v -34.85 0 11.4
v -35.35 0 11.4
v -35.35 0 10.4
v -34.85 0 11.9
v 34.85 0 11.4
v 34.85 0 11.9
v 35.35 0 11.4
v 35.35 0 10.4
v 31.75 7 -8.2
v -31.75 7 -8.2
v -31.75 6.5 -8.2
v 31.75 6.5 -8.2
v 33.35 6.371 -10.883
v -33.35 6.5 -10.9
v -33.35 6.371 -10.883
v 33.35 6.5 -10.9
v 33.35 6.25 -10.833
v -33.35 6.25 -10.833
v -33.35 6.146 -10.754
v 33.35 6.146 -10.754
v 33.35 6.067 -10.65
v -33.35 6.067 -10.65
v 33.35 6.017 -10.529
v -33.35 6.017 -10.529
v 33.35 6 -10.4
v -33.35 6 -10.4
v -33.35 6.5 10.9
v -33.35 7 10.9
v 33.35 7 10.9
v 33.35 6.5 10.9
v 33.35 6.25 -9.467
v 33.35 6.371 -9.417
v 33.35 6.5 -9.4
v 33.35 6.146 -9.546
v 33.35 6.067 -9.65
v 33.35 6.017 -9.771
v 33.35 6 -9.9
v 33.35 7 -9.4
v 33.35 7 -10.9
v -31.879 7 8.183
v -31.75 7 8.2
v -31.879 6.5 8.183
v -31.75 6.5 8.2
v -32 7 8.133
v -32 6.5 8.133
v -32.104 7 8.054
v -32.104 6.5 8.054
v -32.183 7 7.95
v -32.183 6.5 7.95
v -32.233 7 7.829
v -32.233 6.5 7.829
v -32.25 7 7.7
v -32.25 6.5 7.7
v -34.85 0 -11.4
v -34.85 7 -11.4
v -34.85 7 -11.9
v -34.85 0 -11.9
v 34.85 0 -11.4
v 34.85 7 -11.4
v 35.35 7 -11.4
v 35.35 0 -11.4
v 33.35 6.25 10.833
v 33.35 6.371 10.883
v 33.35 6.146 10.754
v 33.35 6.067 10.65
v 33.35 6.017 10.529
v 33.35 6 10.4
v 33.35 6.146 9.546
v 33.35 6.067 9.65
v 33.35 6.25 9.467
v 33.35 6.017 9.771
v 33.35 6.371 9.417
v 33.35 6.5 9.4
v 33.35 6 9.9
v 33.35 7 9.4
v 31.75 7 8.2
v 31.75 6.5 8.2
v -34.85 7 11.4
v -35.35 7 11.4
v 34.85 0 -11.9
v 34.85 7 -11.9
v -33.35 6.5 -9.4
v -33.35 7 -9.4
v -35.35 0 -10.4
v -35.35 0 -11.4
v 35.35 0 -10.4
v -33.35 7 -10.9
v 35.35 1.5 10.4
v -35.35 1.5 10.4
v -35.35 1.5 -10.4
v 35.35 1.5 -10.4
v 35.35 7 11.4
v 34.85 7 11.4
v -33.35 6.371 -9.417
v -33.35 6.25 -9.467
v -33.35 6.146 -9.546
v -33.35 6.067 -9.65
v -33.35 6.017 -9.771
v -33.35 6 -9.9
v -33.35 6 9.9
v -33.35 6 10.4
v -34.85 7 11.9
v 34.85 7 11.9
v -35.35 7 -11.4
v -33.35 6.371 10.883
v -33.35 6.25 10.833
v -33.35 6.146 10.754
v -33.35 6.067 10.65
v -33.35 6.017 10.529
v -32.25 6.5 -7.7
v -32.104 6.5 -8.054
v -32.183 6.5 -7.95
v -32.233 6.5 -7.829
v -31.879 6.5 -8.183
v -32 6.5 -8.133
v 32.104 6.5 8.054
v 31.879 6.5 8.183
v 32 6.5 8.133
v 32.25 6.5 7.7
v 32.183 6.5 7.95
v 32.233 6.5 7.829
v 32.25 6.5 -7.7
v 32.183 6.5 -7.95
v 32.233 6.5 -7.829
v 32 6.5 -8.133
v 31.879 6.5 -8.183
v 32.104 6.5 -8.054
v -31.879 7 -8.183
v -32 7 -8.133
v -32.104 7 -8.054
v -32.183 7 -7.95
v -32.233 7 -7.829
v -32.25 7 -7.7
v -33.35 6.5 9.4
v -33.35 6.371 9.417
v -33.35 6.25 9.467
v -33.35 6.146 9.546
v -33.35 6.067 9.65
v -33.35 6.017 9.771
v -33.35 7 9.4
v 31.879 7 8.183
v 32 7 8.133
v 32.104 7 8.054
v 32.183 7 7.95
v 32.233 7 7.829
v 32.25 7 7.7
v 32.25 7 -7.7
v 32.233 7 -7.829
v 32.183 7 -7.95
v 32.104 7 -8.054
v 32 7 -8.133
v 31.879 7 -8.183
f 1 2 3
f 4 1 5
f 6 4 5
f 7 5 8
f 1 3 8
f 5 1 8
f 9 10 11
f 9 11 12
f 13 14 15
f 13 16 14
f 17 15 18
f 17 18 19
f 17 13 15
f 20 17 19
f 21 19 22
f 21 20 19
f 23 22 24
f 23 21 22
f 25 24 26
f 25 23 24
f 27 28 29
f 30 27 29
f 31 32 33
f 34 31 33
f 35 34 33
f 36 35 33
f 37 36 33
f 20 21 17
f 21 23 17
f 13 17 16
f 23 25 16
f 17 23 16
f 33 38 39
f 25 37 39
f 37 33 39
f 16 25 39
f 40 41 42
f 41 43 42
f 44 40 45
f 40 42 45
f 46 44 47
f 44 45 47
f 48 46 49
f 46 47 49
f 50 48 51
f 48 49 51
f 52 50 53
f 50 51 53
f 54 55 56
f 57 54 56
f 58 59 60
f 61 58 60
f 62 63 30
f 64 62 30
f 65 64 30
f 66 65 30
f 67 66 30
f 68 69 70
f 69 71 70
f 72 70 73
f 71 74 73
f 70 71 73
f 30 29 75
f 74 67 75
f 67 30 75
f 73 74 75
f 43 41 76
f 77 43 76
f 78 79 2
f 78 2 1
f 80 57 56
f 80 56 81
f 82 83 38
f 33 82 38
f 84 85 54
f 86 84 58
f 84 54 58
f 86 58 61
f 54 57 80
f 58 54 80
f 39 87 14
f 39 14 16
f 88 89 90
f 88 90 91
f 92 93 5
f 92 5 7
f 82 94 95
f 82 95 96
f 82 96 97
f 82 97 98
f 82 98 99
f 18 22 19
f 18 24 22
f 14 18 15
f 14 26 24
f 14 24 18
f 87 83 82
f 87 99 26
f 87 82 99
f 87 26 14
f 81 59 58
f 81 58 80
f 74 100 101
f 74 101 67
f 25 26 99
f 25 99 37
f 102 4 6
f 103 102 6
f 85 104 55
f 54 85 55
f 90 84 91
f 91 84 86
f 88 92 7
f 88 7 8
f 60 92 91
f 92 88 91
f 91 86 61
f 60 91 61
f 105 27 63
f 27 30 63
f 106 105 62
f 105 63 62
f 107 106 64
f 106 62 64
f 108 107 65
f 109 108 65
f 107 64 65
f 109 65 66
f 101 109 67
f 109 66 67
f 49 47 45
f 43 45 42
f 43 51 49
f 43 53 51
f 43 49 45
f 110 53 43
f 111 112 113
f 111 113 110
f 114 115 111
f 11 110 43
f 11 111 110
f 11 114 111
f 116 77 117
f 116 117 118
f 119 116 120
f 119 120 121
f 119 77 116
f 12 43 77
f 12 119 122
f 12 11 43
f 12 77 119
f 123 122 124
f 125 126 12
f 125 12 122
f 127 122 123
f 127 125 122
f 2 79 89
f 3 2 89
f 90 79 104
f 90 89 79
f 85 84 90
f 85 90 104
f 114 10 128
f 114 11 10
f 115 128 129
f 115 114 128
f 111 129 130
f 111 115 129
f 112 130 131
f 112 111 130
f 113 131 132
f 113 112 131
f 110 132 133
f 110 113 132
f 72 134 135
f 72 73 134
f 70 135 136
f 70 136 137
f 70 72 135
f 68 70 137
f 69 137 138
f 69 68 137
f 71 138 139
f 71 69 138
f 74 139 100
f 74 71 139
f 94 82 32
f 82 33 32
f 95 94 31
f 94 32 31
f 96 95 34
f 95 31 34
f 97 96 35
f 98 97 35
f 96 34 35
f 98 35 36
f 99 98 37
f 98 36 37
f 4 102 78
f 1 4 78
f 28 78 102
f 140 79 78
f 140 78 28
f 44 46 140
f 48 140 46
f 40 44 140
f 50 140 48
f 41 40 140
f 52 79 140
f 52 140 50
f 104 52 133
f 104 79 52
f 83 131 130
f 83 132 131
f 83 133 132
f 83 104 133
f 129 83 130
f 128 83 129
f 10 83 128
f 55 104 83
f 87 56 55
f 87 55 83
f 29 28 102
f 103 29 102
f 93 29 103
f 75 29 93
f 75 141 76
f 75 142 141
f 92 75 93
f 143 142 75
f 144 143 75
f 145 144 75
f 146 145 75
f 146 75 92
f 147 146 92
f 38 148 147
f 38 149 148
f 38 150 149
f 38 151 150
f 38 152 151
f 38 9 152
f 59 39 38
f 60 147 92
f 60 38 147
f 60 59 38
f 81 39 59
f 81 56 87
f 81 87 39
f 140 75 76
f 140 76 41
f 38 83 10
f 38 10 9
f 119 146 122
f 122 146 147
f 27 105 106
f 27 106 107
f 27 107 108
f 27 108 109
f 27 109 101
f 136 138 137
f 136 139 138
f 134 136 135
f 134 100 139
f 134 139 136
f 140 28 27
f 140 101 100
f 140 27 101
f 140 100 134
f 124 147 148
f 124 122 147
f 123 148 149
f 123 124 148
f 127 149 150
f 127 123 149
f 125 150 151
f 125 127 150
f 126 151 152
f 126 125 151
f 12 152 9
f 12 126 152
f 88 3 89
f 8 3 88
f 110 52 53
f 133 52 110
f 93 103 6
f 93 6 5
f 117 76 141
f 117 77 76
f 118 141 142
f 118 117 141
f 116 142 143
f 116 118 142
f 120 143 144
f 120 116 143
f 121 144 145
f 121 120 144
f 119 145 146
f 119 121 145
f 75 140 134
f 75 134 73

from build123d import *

# Parameters (mm, degrees)
CROQUIS1_W              = 70.7
CROQUIS1_H              = 23.8
SALIENTE_EXTRUIR1_DEPTH = 7
CROQUIS2_W              = 64.5
CROQUIS2_H              = 16.4
CORTAR_EXTRUIR1_DEPTH   = 0.5
REDONDEO1_R             = 0.5
CROQUIS3_W              = 0.5
CROQUIS3_H              = 0.5
CORTAR_EXTRUIR2_DEPTH   = 7
CROQUIS4_W              = 70.7
CROQUIS4_H              = 20.8
CORTAR_EXTRUIR3_DEPTH   = 1.5
CROQUIS5_W              = 66.7
CROQUIS5_H              = 1.5
CORTAR_EXTRUIR4_DEPTH   = 1
REDONDEO2_R             = 0.5


with BuildPart() as part:
    # Croquis1 → Saliente-Extruir1 (new body)
    with BuildSketch(Plane(origin=(0, 0, 0), x_dir=(1, 0, 0), z_dir=(0, 1, 0))):
        Rectangle(CROQUIS1_W, CROQUIS1_H)
    extrude(amount=SALIENTE_EXTRUIR1_DEPTH)

    # Croquis2 → Cortar-Extruir1 (cut)
    with BuildSketch(Plane(origin=(0, 7, 0), x_dir=(1, 0, 0), z_dir=(0, 1, 0))):
        Rectangle(CROQUIS2_W, CROQUIS2_H)
    extrude(amount=-CORTAR_EXTRUIR1_DEPTH, mode=Mode.SUBTRACT)

    # Redondeo1
    redondeo1_edges = [part.edges().sort_by_distance(p)[0] for p in [
        (-32.25, 6.75, 8.2),
        (-32.25, 6.75, -8.2),
        (32.25, 6.75, -8.2),
        (32.25, 6.75, 8.2),
    ]]
    fillet(redondeo1_edges, radius=REDONDEO1_R)

    # Croquis3 → Cortar-Extruir2 (cut)
    with BuildSketch(Plane(origin=(0, 7, 0), x_dir=(1, 0, 0), z_dir=(0, 1, 0))):
        with Locations((-35.1, 11.65)):
            Rectangle(CROQUIS3_W, CROQUIS3_H)
        with Locations((-35.1, -11.65)):
            Rectangle(CROQUIS3_W, CROQUIS3_H)
        with Locations((35.1, -11.65)):
            Rectangle(CROQUIS3_W, CROQUIS3_H)
        with Locations((35.1, 11.65)):
            Rectangle(CROQUIS3_W, CROQUIS3_H)
    extrude(amount=-CORTAR_EXTRUIR2_DEPTH, mode=Mode.SUBTRACT)

    # Croquis4 → Cortar-Extruir3 (cut)
    with BuildSketch(Plane.XZ):
        Rectangle(CROQUIS4_W, CROQUIS4_H)
    extrude(amount=-CORTAR_EXTRUIR3_DEPTH, mode=Mode.SUBTRACT)

    # Croquis5 → Cortar-Extruir4 (cut)
    with BuildSketch(Plane(origin=(0, 7, 0), x_dir=(1, 0, 0), z_dir=(0, 1, 0))):
        with Locations((0, 10.15)):
            Rectangle(CROQUIS5_W, CROQUIS5_H)
        with Locations((0, -10.15)):
            Rectangle(CROQUIS5_W, CROQUIS5_H)
    extrude(amount=-CORTAR_EXTRUIR4_DEPTH, mode=Mode.SUBTRACT)

    # Redondeo2
    redondeo2_edges = [part.edges().sort_by_distance(p)[0] for p in [
        (0, 6, -10.9),
        (0, 6, -9.4),
        (0, 6, 9.4),
        (0, 6, 10.9),
    ]]
    fillet(redondeo2_edges, radius=REDONDEO2_R)


solid = part.part
